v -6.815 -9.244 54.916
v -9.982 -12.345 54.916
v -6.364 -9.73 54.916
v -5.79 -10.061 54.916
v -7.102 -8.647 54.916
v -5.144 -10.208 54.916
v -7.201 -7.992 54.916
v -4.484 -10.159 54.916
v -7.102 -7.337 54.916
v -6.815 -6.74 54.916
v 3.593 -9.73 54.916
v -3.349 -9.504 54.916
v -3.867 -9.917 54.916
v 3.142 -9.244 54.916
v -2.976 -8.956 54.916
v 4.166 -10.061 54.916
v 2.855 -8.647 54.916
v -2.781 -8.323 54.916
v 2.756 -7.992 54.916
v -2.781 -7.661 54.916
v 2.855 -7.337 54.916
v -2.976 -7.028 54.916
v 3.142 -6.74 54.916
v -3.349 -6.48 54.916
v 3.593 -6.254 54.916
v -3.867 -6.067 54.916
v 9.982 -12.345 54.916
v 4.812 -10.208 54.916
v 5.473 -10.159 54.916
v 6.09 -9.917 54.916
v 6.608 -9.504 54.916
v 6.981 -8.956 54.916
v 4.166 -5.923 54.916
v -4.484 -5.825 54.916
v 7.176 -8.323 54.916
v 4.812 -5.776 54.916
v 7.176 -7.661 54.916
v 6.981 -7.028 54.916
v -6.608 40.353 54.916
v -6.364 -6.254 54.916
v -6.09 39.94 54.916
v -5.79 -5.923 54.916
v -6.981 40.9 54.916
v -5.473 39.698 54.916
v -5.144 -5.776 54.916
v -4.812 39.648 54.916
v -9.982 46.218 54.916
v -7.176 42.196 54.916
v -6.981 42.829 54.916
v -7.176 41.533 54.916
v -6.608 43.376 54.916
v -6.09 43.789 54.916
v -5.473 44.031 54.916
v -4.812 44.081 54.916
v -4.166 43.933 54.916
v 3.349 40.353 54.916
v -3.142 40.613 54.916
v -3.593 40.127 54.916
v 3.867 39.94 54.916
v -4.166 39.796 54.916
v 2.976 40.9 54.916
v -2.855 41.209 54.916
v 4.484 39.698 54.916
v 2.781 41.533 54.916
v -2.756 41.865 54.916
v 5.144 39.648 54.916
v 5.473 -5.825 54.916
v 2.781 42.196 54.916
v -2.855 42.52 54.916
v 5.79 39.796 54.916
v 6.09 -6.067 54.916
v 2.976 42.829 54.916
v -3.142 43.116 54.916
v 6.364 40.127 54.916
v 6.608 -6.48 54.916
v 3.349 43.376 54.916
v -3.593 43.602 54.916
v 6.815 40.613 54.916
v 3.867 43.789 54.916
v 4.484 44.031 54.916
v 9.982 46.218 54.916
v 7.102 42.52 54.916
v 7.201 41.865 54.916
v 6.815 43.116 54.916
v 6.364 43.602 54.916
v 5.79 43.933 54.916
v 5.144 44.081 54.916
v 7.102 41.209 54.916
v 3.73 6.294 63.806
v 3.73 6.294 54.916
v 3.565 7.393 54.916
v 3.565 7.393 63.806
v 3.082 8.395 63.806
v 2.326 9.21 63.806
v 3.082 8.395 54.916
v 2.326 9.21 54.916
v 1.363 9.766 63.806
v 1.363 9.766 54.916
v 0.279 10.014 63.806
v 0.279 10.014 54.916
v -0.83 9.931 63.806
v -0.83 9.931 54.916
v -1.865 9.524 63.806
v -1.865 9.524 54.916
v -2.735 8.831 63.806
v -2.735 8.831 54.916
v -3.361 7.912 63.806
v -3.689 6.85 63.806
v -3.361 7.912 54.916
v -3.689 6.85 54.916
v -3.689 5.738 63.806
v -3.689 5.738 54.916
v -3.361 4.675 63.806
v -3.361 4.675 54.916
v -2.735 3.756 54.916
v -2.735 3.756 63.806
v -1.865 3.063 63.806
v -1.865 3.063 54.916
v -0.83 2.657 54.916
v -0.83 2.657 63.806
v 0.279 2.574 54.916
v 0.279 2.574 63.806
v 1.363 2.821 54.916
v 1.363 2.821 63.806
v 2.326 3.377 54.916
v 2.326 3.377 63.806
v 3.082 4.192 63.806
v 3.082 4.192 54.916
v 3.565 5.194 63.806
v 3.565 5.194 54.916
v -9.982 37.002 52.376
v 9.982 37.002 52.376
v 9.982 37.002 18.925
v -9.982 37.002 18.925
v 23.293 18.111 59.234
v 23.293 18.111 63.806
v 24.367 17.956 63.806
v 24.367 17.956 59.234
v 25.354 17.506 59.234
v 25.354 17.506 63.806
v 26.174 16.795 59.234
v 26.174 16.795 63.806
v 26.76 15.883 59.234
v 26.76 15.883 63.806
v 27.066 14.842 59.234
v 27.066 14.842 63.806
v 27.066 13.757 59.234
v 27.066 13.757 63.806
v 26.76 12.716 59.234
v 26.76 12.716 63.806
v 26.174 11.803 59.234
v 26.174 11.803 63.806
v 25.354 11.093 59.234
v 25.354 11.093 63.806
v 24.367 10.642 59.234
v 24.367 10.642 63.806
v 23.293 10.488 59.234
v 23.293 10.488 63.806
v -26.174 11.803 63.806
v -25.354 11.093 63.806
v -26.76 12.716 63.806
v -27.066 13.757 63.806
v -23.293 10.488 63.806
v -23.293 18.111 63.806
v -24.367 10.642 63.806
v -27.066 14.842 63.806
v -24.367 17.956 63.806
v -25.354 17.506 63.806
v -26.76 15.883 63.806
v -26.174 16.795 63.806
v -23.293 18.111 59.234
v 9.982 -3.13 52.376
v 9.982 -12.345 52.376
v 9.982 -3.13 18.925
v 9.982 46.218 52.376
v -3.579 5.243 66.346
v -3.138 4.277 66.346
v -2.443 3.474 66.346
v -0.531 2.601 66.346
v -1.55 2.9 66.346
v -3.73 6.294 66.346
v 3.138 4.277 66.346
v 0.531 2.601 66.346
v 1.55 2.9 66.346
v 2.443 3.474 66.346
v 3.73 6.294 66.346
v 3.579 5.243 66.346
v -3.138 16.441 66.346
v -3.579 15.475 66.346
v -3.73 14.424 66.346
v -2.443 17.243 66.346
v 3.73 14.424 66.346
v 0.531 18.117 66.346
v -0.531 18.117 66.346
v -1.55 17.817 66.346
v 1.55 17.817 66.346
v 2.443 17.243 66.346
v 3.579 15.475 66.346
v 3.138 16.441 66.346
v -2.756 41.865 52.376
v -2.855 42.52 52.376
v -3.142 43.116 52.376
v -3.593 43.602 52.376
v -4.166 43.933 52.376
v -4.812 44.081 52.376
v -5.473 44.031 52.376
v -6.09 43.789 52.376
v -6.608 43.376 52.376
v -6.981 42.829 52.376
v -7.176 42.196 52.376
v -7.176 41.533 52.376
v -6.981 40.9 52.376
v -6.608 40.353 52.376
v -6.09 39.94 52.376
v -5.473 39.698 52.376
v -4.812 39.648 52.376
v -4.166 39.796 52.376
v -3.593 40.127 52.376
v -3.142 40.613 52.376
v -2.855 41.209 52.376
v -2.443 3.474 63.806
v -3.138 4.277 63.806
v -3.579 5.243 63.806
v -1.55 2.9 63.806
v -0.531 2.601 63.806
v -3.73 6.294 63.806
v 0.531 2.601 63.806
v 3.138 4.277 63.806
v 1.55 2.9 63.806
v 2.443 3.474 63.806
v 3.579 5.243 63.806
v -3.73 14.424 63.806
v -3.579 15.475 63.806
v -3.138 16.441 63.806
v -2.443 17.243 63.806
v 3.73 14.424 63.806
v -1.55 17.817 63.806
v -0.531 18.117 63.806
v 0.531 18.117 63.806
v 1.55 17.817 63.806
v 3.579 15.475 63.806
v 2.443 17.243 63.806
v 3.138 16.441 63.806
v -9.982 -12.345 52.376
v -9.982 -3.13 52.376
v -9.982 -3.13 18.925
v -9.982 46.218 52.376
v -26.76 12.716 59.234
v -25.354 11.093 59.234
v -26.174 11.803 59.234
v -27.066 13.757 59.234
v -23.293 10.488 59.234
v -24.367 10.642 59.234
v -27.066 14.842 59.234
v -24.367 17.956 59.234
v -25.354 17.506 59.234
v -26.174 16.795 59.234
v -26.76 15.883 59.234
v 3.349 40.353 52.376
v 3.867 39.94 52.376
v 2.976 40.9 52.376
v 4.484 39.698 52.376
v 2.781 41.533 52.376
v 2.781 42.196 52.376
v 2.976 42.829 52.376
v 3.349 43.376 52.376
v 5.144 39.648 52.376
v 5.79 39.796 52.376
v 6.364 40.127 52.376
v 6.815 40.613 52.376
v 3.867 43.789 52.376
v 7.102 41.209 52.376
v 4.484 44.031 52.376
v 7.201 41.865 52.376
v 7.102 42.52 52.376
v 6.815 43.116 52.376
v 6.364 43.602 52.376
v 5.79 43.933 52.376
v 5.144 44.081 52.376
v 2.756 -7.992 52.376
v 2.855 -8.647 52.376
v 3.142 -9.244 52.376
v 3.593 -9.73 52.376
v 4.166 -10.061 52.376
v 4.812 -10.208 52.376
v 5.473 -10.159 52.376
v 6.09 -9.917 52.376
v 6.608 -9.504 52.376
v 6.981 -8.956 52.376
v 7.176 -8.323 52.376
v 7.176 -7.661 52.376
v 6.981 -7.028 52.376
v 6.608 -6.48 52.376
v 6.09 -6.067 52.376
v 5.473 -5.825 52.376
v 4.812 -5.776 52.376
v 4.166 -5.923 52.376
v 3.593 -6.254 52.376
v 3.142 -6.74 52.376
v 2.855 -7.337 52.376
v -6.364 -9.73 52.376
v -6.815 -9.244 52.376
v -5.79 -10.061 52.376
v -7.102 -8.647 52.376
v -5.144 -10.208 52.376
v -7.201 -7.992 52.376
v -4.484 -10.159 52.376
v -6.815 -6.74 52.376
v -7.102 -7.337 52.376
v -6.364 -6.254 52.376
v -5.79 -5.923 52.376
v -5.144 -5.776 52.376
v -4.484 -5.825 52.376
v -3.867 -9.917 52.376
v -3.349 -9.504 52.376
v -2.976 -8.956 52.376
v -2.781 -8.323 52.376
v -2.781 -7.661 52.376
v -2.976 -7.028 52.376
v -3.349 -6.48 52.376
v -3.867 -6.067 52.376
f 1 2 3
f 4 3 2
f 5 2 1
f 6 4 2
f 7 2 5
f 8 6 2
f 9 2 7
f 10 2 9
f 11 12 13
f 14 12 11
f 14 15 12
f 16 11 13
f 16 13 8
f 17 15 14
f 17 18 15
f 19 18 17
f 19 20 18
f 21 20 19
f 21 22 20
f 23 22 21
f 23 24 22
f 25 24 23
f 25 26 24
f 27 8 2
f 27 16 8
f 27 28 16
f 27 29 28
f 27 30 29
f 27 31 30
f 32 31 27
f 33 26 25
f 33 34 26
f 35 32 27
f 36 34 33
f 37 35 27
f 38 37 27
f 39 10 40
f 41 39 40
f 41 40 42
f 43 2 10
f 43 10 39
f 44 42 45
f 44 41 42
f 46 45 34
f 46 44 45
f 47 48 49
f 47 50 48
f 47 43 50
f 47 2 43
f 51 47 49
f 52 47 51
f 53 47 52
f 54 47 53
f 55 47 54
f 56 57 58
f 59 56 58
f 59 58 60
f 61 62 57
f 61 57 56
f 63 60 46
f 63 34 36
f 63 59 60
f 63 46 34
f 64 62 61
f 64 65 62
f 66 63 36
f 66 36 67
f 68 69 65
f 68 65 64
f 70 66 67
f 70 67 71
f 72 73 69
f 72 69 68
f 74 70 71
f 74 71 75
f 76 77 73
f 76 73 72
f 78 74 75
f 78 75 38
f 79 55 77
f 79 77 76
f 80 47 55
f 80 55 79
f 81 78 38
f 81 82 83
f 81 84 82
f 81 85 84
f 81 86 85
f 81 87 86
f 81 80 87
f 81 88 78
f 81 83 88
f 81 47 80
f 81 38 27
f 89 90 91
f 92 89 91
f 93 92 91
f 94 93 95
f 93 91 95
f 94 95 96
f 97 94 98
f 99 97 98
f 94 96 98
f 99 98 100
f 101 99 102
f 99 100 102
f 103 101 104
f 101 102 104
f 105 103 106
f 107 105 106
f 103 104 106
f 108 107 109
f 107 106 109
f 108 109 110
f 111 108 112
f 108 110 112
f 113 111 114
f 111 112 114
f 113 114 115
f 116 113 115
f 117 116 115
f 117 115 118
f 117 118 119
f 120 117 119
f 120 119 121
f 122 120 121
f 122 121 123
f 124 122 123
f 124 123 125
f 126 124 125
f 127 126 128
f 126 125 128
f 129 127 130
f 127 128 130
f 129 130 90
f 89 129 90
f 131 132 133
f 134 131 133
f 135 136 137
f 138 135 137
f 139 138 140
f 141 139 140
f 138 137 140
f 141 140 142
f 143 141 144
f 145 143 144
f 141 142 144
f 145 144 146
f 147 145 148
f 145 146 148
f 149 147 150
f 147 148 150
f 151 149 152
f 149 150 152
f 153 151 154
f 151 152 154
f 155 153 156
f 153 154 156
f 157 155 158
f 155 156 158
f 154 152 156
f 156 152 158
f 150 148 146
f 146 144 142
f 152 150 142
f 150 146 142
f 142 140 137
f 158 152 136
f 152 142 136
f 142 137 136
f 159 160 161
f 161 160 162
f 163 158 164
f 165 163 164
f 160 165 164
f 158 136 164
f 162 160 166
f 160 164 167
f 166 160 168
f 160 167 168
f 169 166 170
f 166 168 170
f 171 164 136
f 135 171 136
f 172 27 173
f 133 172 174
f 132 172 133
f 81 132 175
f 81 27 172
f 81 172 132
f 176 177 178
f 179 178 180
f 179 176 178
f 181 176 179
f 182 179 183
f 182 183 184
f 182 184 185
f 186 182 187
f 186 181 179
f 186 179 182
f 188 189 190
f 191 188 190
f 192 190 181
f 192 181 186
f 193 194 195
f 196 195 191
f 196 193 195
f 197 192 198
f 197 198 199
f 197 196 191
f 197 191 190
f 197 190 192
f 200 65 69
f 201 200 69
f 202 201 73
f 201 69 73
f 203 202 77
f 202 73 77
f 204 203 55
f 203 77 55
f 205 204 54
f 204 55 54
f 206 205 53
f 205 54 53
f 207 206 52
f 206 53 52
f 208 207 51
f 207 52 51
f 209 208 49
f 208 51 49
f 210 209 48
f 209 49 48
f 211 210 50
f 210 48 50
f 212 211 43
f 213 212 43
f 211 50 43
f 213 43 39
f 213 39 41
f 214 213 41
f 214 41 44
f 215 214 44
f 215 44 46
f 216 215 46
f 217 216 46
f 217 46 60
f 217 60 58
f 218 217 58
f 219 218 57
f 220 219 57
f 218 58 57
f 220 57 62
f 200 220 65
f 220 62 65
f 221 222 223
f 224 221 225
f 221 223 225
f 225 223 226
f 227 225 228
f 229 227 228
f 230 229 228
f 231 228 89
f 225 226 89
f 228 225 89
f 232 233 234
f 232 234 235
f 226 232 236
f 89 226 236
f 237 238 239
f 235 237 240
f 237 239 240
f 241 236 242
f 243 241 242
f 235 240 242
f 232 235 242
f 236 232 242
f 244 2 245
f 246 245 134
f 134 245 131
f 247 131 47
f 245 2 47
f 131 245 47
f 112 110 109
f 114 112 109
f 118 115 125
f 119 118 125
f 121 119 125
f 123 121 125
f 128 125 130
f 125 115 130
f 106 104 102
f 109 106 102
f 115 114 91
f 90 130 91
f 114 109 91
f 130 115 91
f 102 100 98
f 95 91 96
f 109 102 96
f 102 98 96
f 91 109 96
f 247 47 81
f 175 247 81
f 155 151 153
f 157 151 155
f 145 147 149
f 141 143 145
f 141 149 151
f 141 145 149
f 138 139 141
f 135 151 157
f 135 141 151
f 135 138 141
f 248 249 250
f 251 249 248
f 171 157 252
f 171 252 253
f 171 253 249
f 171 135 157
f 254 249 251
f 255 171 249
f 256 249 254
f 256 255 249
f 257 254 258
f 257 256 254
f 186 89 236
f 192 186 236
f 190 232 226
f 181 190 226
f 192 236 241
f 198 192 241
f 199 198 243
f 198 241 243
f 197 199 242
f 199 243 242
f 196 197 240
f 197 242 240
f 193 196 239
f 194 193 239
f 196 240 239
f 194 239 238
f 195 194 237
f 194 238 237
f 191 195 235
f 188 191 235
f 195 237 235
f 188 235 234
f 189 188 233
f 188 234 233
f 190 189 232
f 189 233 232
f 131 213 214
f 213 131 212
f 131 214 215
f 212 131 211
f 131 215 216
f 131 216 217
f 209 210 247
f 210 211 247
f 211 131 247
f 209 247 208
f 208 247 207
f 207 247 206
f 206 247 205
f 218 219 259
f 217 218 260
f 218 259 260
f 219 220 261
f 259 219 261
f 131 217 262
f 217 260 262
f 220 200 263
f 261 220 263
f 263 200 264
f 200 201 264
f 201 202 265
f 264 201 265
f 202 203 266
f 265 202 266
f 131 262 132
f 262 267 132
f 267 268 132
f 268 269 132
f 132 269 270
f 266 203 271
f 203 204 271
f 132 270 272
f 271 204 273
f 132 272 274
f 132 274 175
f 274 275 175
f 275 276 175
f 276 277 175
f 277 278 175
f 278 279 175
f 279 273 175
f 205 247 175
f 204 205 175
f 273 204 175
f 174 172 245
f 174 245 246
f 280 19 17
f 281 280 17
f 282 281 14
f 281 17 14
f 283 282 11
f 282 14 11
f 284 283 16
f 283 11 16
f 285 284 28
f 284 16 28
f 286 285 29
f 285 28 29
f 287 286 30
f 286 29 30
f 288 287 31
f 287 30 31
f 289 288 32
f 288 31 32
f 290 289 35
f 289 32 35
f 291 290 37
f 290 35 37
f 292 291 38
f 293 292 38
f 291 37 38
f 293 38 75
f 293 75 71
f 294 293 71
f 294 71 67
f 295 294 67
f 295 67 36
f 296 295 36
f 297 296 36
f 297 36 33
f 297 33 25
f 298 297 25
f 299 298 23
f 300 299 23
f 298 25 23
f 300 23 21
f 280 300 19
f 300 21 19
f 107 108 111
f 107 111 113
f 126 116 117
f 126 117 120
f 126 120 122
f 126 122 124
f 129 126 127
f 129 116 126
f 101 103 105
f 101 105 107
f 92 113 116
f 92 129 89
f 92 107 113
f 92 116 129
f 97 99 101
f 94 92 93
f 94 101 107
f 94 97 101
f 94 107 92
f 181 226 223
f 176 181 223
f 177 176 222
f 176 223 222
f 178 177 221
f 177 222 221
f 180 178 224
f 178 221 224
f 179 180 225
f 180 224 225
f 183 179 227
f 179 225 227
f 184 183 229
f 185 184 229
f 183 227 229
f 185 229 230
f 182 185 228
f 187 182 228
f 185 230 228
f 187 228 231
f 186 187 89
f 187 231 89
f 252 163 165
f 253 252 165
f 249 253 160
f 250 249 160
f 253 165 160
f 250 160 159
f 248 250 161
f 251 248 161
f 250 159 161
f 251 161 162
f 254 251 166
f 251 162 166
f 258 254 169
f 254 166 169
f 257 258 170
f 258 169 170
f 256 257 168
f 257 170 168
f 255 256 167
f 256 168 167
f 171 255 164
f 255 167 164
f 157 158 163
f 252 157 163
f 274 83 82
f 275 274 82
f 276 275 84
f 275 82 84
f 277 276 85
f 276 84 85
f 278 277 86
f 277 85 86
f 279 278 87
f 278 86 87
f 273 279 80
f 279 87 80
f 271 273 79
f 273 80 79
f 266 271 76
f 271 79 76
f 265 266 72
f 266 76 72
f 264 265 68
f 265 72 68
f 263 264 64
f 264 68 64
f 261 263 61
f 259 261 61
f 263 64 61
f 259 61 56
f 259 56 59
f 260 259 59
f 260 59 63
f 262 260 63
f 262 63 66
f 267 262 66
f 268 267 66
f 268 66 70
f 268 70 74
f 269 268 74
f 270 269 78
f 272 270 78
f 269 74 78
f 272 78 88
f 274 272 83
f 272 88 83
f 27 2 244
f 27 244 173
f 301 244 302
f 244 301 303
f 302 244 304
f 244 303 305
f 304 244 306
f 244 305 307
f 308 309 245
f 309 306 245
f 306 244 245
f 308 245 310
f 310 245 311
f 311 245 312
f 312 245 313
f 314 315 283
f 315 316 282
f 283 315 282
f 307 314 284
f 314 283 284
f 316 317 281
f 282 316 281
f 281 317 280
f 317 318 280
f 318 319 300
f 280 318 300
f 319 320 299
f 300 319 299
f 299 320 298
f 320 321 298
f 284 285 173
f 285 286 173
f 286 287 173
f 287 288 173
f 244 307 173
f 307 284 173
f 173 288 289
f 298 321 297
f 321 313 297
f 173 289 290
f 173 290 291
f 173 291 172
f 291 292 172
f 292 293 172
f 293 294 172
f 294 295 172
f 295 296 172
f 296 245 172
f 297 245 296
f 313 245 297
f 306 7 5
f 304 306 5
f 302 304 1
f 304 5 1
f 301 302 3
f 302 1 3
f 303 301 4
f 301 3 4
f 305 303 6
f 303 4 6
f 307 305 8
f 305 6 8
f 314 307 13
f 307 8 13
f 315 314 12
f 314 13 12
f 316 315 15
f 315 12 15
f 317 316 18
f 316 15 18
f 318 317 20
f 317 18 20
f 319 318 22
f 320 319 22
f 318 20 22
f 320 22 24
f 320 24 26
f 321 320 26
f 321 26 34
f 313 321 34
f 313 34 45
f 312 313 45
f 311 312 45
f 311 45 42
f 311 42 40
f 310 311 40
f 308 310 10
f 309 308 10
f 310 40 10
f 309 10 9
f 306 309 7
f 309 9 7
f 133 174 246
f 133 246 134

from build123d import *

# Parameters (mm, degrees)
SKETCH1_W      = 35.9918
SKETCH1_H      = 40.132
EXTRUDE1_DEPTH = 9.9822
SKETCH2_R      = 3.730476731
EXTRUDE2_DEPTH = 8.89
EXTRUDE3_DEPTH = 4.572
EXTRUDE4_DEPTH = 2.54
SKETCH5_W      = 19.9644
SKETCH5_H      = 9.215392605
SKETCH5_R      = 2.2225
SKETCH5_H_2    = 9.215392606
EXTRUDE5_DEPTH = 2.54


with BuildPart() as part:
    # Sketch1 → Extrude1 (new, symmetric)
    with BuildSketch(Plane(origin=(0, 0, 0), x_dir=(0, 0, -1), z_dir=(1, 0, 0))):
        with Locations((-36.920443218, 16.936283292)):
            Rectangle(SKETCH1_W, SKETCH1_H)
    extrude(amount=EXTRUDE1_DEPTH, both=True)

    # Sketch5 → Extrude5 (add)
    # profile 1 of 2: a face of its own
    with BuildSketch(Plane.XY.offset(54.916343218)):
        with Locations((0, 41.609979595)):
            Rectangle(SKETCH5_W, SKETCH5_H)
        with Locations((4.9784, 41.86450492)):
            Circle(SKETCH5_R, mode=Mode.SUBTRACT)
        with Locations((-4.9784, 41.86450492)):
            Circle(SKETCH5_R, mode=Mode.SUBTRACT)
    # profile 2 of 2: a face of its own
    with BuildSketch(Plane.XY.offset(54.916343218)):
        with Locations((0, -7.737413011)):
            Rectangle(SKETCH5_W, SKETCH5_H_2)
        with Locations(Location((-4.9784, -7.991938336, 0), (0, 0, 180))):
            Circle(SKETCH5_R, mode=Mode.SUBTRACT)
        with Locations(Location((4.9784, -7.991938336, 0), (0, 0, 180))):
            Circle(SKETCH5_R, mode=Mode.SUBTRACT)
    extrude(amount=-EXTRUDE5_DEPTH)


with BuildPart() as body_2:
    # Sketch2 → Extrude2 (new body)
    with BuildSketch(Plane.XY.offset(54.916343218)):
        with Locations((0, 6.293683292)):
            Circle(SKETCH2_R)
    extrude(amount=EXTRUDE2_DEPTH)


with BuildPart() as body_3:
    # Sketch3 → Extrude3 (new body)
    with BuildSketch(Plane.XY.offset(63.806343218)):
        with BuildLine():
            Line((23.293134334, 10.487985686), (-23.293134334, 10.487985686))
            ThreePointArc((-23.293134334, 10.487985686), (-27.10453386, 14.299385211), (-23.293134334, 18.110784737))
            Line((-23.293134334, 18.110784737), (23.293134334, 18.110784737))
            ThreePointArc((23.293134334, 18.110784737), (27.10453386, 14.299385211), (23.293134334, 10.487985686))
        make_face()
    extrude(amount=-EXTRUDE3_DEPTH)


with BuildPart() as body_4:
    # Sketch4 → Extrude4 (new body)
    with BuildSketch(Plane.XY.offset(63.806343218)):
        with BuildLine():
            Line((-3.730476731, 14.424128755), (-3.730476731, 6.293683292))
            ThreePointArc((-3.730476731, 6.293683292), (0, 2.563206561), (3.730476731, 6.293683292))
            Line((3.730476731, 6.293683292), (3.730476731, 14.424128755))
            ThreePointArc((3.730476731, 14.424128755), (0, 18.154605486), (-3.730476731, 14.424128755))
        make_face()
    extrude(amount=EXTRUDE4_DEPTH)


solid = Compound([part.part, body_2.part, body_3.part, body_4.part])
